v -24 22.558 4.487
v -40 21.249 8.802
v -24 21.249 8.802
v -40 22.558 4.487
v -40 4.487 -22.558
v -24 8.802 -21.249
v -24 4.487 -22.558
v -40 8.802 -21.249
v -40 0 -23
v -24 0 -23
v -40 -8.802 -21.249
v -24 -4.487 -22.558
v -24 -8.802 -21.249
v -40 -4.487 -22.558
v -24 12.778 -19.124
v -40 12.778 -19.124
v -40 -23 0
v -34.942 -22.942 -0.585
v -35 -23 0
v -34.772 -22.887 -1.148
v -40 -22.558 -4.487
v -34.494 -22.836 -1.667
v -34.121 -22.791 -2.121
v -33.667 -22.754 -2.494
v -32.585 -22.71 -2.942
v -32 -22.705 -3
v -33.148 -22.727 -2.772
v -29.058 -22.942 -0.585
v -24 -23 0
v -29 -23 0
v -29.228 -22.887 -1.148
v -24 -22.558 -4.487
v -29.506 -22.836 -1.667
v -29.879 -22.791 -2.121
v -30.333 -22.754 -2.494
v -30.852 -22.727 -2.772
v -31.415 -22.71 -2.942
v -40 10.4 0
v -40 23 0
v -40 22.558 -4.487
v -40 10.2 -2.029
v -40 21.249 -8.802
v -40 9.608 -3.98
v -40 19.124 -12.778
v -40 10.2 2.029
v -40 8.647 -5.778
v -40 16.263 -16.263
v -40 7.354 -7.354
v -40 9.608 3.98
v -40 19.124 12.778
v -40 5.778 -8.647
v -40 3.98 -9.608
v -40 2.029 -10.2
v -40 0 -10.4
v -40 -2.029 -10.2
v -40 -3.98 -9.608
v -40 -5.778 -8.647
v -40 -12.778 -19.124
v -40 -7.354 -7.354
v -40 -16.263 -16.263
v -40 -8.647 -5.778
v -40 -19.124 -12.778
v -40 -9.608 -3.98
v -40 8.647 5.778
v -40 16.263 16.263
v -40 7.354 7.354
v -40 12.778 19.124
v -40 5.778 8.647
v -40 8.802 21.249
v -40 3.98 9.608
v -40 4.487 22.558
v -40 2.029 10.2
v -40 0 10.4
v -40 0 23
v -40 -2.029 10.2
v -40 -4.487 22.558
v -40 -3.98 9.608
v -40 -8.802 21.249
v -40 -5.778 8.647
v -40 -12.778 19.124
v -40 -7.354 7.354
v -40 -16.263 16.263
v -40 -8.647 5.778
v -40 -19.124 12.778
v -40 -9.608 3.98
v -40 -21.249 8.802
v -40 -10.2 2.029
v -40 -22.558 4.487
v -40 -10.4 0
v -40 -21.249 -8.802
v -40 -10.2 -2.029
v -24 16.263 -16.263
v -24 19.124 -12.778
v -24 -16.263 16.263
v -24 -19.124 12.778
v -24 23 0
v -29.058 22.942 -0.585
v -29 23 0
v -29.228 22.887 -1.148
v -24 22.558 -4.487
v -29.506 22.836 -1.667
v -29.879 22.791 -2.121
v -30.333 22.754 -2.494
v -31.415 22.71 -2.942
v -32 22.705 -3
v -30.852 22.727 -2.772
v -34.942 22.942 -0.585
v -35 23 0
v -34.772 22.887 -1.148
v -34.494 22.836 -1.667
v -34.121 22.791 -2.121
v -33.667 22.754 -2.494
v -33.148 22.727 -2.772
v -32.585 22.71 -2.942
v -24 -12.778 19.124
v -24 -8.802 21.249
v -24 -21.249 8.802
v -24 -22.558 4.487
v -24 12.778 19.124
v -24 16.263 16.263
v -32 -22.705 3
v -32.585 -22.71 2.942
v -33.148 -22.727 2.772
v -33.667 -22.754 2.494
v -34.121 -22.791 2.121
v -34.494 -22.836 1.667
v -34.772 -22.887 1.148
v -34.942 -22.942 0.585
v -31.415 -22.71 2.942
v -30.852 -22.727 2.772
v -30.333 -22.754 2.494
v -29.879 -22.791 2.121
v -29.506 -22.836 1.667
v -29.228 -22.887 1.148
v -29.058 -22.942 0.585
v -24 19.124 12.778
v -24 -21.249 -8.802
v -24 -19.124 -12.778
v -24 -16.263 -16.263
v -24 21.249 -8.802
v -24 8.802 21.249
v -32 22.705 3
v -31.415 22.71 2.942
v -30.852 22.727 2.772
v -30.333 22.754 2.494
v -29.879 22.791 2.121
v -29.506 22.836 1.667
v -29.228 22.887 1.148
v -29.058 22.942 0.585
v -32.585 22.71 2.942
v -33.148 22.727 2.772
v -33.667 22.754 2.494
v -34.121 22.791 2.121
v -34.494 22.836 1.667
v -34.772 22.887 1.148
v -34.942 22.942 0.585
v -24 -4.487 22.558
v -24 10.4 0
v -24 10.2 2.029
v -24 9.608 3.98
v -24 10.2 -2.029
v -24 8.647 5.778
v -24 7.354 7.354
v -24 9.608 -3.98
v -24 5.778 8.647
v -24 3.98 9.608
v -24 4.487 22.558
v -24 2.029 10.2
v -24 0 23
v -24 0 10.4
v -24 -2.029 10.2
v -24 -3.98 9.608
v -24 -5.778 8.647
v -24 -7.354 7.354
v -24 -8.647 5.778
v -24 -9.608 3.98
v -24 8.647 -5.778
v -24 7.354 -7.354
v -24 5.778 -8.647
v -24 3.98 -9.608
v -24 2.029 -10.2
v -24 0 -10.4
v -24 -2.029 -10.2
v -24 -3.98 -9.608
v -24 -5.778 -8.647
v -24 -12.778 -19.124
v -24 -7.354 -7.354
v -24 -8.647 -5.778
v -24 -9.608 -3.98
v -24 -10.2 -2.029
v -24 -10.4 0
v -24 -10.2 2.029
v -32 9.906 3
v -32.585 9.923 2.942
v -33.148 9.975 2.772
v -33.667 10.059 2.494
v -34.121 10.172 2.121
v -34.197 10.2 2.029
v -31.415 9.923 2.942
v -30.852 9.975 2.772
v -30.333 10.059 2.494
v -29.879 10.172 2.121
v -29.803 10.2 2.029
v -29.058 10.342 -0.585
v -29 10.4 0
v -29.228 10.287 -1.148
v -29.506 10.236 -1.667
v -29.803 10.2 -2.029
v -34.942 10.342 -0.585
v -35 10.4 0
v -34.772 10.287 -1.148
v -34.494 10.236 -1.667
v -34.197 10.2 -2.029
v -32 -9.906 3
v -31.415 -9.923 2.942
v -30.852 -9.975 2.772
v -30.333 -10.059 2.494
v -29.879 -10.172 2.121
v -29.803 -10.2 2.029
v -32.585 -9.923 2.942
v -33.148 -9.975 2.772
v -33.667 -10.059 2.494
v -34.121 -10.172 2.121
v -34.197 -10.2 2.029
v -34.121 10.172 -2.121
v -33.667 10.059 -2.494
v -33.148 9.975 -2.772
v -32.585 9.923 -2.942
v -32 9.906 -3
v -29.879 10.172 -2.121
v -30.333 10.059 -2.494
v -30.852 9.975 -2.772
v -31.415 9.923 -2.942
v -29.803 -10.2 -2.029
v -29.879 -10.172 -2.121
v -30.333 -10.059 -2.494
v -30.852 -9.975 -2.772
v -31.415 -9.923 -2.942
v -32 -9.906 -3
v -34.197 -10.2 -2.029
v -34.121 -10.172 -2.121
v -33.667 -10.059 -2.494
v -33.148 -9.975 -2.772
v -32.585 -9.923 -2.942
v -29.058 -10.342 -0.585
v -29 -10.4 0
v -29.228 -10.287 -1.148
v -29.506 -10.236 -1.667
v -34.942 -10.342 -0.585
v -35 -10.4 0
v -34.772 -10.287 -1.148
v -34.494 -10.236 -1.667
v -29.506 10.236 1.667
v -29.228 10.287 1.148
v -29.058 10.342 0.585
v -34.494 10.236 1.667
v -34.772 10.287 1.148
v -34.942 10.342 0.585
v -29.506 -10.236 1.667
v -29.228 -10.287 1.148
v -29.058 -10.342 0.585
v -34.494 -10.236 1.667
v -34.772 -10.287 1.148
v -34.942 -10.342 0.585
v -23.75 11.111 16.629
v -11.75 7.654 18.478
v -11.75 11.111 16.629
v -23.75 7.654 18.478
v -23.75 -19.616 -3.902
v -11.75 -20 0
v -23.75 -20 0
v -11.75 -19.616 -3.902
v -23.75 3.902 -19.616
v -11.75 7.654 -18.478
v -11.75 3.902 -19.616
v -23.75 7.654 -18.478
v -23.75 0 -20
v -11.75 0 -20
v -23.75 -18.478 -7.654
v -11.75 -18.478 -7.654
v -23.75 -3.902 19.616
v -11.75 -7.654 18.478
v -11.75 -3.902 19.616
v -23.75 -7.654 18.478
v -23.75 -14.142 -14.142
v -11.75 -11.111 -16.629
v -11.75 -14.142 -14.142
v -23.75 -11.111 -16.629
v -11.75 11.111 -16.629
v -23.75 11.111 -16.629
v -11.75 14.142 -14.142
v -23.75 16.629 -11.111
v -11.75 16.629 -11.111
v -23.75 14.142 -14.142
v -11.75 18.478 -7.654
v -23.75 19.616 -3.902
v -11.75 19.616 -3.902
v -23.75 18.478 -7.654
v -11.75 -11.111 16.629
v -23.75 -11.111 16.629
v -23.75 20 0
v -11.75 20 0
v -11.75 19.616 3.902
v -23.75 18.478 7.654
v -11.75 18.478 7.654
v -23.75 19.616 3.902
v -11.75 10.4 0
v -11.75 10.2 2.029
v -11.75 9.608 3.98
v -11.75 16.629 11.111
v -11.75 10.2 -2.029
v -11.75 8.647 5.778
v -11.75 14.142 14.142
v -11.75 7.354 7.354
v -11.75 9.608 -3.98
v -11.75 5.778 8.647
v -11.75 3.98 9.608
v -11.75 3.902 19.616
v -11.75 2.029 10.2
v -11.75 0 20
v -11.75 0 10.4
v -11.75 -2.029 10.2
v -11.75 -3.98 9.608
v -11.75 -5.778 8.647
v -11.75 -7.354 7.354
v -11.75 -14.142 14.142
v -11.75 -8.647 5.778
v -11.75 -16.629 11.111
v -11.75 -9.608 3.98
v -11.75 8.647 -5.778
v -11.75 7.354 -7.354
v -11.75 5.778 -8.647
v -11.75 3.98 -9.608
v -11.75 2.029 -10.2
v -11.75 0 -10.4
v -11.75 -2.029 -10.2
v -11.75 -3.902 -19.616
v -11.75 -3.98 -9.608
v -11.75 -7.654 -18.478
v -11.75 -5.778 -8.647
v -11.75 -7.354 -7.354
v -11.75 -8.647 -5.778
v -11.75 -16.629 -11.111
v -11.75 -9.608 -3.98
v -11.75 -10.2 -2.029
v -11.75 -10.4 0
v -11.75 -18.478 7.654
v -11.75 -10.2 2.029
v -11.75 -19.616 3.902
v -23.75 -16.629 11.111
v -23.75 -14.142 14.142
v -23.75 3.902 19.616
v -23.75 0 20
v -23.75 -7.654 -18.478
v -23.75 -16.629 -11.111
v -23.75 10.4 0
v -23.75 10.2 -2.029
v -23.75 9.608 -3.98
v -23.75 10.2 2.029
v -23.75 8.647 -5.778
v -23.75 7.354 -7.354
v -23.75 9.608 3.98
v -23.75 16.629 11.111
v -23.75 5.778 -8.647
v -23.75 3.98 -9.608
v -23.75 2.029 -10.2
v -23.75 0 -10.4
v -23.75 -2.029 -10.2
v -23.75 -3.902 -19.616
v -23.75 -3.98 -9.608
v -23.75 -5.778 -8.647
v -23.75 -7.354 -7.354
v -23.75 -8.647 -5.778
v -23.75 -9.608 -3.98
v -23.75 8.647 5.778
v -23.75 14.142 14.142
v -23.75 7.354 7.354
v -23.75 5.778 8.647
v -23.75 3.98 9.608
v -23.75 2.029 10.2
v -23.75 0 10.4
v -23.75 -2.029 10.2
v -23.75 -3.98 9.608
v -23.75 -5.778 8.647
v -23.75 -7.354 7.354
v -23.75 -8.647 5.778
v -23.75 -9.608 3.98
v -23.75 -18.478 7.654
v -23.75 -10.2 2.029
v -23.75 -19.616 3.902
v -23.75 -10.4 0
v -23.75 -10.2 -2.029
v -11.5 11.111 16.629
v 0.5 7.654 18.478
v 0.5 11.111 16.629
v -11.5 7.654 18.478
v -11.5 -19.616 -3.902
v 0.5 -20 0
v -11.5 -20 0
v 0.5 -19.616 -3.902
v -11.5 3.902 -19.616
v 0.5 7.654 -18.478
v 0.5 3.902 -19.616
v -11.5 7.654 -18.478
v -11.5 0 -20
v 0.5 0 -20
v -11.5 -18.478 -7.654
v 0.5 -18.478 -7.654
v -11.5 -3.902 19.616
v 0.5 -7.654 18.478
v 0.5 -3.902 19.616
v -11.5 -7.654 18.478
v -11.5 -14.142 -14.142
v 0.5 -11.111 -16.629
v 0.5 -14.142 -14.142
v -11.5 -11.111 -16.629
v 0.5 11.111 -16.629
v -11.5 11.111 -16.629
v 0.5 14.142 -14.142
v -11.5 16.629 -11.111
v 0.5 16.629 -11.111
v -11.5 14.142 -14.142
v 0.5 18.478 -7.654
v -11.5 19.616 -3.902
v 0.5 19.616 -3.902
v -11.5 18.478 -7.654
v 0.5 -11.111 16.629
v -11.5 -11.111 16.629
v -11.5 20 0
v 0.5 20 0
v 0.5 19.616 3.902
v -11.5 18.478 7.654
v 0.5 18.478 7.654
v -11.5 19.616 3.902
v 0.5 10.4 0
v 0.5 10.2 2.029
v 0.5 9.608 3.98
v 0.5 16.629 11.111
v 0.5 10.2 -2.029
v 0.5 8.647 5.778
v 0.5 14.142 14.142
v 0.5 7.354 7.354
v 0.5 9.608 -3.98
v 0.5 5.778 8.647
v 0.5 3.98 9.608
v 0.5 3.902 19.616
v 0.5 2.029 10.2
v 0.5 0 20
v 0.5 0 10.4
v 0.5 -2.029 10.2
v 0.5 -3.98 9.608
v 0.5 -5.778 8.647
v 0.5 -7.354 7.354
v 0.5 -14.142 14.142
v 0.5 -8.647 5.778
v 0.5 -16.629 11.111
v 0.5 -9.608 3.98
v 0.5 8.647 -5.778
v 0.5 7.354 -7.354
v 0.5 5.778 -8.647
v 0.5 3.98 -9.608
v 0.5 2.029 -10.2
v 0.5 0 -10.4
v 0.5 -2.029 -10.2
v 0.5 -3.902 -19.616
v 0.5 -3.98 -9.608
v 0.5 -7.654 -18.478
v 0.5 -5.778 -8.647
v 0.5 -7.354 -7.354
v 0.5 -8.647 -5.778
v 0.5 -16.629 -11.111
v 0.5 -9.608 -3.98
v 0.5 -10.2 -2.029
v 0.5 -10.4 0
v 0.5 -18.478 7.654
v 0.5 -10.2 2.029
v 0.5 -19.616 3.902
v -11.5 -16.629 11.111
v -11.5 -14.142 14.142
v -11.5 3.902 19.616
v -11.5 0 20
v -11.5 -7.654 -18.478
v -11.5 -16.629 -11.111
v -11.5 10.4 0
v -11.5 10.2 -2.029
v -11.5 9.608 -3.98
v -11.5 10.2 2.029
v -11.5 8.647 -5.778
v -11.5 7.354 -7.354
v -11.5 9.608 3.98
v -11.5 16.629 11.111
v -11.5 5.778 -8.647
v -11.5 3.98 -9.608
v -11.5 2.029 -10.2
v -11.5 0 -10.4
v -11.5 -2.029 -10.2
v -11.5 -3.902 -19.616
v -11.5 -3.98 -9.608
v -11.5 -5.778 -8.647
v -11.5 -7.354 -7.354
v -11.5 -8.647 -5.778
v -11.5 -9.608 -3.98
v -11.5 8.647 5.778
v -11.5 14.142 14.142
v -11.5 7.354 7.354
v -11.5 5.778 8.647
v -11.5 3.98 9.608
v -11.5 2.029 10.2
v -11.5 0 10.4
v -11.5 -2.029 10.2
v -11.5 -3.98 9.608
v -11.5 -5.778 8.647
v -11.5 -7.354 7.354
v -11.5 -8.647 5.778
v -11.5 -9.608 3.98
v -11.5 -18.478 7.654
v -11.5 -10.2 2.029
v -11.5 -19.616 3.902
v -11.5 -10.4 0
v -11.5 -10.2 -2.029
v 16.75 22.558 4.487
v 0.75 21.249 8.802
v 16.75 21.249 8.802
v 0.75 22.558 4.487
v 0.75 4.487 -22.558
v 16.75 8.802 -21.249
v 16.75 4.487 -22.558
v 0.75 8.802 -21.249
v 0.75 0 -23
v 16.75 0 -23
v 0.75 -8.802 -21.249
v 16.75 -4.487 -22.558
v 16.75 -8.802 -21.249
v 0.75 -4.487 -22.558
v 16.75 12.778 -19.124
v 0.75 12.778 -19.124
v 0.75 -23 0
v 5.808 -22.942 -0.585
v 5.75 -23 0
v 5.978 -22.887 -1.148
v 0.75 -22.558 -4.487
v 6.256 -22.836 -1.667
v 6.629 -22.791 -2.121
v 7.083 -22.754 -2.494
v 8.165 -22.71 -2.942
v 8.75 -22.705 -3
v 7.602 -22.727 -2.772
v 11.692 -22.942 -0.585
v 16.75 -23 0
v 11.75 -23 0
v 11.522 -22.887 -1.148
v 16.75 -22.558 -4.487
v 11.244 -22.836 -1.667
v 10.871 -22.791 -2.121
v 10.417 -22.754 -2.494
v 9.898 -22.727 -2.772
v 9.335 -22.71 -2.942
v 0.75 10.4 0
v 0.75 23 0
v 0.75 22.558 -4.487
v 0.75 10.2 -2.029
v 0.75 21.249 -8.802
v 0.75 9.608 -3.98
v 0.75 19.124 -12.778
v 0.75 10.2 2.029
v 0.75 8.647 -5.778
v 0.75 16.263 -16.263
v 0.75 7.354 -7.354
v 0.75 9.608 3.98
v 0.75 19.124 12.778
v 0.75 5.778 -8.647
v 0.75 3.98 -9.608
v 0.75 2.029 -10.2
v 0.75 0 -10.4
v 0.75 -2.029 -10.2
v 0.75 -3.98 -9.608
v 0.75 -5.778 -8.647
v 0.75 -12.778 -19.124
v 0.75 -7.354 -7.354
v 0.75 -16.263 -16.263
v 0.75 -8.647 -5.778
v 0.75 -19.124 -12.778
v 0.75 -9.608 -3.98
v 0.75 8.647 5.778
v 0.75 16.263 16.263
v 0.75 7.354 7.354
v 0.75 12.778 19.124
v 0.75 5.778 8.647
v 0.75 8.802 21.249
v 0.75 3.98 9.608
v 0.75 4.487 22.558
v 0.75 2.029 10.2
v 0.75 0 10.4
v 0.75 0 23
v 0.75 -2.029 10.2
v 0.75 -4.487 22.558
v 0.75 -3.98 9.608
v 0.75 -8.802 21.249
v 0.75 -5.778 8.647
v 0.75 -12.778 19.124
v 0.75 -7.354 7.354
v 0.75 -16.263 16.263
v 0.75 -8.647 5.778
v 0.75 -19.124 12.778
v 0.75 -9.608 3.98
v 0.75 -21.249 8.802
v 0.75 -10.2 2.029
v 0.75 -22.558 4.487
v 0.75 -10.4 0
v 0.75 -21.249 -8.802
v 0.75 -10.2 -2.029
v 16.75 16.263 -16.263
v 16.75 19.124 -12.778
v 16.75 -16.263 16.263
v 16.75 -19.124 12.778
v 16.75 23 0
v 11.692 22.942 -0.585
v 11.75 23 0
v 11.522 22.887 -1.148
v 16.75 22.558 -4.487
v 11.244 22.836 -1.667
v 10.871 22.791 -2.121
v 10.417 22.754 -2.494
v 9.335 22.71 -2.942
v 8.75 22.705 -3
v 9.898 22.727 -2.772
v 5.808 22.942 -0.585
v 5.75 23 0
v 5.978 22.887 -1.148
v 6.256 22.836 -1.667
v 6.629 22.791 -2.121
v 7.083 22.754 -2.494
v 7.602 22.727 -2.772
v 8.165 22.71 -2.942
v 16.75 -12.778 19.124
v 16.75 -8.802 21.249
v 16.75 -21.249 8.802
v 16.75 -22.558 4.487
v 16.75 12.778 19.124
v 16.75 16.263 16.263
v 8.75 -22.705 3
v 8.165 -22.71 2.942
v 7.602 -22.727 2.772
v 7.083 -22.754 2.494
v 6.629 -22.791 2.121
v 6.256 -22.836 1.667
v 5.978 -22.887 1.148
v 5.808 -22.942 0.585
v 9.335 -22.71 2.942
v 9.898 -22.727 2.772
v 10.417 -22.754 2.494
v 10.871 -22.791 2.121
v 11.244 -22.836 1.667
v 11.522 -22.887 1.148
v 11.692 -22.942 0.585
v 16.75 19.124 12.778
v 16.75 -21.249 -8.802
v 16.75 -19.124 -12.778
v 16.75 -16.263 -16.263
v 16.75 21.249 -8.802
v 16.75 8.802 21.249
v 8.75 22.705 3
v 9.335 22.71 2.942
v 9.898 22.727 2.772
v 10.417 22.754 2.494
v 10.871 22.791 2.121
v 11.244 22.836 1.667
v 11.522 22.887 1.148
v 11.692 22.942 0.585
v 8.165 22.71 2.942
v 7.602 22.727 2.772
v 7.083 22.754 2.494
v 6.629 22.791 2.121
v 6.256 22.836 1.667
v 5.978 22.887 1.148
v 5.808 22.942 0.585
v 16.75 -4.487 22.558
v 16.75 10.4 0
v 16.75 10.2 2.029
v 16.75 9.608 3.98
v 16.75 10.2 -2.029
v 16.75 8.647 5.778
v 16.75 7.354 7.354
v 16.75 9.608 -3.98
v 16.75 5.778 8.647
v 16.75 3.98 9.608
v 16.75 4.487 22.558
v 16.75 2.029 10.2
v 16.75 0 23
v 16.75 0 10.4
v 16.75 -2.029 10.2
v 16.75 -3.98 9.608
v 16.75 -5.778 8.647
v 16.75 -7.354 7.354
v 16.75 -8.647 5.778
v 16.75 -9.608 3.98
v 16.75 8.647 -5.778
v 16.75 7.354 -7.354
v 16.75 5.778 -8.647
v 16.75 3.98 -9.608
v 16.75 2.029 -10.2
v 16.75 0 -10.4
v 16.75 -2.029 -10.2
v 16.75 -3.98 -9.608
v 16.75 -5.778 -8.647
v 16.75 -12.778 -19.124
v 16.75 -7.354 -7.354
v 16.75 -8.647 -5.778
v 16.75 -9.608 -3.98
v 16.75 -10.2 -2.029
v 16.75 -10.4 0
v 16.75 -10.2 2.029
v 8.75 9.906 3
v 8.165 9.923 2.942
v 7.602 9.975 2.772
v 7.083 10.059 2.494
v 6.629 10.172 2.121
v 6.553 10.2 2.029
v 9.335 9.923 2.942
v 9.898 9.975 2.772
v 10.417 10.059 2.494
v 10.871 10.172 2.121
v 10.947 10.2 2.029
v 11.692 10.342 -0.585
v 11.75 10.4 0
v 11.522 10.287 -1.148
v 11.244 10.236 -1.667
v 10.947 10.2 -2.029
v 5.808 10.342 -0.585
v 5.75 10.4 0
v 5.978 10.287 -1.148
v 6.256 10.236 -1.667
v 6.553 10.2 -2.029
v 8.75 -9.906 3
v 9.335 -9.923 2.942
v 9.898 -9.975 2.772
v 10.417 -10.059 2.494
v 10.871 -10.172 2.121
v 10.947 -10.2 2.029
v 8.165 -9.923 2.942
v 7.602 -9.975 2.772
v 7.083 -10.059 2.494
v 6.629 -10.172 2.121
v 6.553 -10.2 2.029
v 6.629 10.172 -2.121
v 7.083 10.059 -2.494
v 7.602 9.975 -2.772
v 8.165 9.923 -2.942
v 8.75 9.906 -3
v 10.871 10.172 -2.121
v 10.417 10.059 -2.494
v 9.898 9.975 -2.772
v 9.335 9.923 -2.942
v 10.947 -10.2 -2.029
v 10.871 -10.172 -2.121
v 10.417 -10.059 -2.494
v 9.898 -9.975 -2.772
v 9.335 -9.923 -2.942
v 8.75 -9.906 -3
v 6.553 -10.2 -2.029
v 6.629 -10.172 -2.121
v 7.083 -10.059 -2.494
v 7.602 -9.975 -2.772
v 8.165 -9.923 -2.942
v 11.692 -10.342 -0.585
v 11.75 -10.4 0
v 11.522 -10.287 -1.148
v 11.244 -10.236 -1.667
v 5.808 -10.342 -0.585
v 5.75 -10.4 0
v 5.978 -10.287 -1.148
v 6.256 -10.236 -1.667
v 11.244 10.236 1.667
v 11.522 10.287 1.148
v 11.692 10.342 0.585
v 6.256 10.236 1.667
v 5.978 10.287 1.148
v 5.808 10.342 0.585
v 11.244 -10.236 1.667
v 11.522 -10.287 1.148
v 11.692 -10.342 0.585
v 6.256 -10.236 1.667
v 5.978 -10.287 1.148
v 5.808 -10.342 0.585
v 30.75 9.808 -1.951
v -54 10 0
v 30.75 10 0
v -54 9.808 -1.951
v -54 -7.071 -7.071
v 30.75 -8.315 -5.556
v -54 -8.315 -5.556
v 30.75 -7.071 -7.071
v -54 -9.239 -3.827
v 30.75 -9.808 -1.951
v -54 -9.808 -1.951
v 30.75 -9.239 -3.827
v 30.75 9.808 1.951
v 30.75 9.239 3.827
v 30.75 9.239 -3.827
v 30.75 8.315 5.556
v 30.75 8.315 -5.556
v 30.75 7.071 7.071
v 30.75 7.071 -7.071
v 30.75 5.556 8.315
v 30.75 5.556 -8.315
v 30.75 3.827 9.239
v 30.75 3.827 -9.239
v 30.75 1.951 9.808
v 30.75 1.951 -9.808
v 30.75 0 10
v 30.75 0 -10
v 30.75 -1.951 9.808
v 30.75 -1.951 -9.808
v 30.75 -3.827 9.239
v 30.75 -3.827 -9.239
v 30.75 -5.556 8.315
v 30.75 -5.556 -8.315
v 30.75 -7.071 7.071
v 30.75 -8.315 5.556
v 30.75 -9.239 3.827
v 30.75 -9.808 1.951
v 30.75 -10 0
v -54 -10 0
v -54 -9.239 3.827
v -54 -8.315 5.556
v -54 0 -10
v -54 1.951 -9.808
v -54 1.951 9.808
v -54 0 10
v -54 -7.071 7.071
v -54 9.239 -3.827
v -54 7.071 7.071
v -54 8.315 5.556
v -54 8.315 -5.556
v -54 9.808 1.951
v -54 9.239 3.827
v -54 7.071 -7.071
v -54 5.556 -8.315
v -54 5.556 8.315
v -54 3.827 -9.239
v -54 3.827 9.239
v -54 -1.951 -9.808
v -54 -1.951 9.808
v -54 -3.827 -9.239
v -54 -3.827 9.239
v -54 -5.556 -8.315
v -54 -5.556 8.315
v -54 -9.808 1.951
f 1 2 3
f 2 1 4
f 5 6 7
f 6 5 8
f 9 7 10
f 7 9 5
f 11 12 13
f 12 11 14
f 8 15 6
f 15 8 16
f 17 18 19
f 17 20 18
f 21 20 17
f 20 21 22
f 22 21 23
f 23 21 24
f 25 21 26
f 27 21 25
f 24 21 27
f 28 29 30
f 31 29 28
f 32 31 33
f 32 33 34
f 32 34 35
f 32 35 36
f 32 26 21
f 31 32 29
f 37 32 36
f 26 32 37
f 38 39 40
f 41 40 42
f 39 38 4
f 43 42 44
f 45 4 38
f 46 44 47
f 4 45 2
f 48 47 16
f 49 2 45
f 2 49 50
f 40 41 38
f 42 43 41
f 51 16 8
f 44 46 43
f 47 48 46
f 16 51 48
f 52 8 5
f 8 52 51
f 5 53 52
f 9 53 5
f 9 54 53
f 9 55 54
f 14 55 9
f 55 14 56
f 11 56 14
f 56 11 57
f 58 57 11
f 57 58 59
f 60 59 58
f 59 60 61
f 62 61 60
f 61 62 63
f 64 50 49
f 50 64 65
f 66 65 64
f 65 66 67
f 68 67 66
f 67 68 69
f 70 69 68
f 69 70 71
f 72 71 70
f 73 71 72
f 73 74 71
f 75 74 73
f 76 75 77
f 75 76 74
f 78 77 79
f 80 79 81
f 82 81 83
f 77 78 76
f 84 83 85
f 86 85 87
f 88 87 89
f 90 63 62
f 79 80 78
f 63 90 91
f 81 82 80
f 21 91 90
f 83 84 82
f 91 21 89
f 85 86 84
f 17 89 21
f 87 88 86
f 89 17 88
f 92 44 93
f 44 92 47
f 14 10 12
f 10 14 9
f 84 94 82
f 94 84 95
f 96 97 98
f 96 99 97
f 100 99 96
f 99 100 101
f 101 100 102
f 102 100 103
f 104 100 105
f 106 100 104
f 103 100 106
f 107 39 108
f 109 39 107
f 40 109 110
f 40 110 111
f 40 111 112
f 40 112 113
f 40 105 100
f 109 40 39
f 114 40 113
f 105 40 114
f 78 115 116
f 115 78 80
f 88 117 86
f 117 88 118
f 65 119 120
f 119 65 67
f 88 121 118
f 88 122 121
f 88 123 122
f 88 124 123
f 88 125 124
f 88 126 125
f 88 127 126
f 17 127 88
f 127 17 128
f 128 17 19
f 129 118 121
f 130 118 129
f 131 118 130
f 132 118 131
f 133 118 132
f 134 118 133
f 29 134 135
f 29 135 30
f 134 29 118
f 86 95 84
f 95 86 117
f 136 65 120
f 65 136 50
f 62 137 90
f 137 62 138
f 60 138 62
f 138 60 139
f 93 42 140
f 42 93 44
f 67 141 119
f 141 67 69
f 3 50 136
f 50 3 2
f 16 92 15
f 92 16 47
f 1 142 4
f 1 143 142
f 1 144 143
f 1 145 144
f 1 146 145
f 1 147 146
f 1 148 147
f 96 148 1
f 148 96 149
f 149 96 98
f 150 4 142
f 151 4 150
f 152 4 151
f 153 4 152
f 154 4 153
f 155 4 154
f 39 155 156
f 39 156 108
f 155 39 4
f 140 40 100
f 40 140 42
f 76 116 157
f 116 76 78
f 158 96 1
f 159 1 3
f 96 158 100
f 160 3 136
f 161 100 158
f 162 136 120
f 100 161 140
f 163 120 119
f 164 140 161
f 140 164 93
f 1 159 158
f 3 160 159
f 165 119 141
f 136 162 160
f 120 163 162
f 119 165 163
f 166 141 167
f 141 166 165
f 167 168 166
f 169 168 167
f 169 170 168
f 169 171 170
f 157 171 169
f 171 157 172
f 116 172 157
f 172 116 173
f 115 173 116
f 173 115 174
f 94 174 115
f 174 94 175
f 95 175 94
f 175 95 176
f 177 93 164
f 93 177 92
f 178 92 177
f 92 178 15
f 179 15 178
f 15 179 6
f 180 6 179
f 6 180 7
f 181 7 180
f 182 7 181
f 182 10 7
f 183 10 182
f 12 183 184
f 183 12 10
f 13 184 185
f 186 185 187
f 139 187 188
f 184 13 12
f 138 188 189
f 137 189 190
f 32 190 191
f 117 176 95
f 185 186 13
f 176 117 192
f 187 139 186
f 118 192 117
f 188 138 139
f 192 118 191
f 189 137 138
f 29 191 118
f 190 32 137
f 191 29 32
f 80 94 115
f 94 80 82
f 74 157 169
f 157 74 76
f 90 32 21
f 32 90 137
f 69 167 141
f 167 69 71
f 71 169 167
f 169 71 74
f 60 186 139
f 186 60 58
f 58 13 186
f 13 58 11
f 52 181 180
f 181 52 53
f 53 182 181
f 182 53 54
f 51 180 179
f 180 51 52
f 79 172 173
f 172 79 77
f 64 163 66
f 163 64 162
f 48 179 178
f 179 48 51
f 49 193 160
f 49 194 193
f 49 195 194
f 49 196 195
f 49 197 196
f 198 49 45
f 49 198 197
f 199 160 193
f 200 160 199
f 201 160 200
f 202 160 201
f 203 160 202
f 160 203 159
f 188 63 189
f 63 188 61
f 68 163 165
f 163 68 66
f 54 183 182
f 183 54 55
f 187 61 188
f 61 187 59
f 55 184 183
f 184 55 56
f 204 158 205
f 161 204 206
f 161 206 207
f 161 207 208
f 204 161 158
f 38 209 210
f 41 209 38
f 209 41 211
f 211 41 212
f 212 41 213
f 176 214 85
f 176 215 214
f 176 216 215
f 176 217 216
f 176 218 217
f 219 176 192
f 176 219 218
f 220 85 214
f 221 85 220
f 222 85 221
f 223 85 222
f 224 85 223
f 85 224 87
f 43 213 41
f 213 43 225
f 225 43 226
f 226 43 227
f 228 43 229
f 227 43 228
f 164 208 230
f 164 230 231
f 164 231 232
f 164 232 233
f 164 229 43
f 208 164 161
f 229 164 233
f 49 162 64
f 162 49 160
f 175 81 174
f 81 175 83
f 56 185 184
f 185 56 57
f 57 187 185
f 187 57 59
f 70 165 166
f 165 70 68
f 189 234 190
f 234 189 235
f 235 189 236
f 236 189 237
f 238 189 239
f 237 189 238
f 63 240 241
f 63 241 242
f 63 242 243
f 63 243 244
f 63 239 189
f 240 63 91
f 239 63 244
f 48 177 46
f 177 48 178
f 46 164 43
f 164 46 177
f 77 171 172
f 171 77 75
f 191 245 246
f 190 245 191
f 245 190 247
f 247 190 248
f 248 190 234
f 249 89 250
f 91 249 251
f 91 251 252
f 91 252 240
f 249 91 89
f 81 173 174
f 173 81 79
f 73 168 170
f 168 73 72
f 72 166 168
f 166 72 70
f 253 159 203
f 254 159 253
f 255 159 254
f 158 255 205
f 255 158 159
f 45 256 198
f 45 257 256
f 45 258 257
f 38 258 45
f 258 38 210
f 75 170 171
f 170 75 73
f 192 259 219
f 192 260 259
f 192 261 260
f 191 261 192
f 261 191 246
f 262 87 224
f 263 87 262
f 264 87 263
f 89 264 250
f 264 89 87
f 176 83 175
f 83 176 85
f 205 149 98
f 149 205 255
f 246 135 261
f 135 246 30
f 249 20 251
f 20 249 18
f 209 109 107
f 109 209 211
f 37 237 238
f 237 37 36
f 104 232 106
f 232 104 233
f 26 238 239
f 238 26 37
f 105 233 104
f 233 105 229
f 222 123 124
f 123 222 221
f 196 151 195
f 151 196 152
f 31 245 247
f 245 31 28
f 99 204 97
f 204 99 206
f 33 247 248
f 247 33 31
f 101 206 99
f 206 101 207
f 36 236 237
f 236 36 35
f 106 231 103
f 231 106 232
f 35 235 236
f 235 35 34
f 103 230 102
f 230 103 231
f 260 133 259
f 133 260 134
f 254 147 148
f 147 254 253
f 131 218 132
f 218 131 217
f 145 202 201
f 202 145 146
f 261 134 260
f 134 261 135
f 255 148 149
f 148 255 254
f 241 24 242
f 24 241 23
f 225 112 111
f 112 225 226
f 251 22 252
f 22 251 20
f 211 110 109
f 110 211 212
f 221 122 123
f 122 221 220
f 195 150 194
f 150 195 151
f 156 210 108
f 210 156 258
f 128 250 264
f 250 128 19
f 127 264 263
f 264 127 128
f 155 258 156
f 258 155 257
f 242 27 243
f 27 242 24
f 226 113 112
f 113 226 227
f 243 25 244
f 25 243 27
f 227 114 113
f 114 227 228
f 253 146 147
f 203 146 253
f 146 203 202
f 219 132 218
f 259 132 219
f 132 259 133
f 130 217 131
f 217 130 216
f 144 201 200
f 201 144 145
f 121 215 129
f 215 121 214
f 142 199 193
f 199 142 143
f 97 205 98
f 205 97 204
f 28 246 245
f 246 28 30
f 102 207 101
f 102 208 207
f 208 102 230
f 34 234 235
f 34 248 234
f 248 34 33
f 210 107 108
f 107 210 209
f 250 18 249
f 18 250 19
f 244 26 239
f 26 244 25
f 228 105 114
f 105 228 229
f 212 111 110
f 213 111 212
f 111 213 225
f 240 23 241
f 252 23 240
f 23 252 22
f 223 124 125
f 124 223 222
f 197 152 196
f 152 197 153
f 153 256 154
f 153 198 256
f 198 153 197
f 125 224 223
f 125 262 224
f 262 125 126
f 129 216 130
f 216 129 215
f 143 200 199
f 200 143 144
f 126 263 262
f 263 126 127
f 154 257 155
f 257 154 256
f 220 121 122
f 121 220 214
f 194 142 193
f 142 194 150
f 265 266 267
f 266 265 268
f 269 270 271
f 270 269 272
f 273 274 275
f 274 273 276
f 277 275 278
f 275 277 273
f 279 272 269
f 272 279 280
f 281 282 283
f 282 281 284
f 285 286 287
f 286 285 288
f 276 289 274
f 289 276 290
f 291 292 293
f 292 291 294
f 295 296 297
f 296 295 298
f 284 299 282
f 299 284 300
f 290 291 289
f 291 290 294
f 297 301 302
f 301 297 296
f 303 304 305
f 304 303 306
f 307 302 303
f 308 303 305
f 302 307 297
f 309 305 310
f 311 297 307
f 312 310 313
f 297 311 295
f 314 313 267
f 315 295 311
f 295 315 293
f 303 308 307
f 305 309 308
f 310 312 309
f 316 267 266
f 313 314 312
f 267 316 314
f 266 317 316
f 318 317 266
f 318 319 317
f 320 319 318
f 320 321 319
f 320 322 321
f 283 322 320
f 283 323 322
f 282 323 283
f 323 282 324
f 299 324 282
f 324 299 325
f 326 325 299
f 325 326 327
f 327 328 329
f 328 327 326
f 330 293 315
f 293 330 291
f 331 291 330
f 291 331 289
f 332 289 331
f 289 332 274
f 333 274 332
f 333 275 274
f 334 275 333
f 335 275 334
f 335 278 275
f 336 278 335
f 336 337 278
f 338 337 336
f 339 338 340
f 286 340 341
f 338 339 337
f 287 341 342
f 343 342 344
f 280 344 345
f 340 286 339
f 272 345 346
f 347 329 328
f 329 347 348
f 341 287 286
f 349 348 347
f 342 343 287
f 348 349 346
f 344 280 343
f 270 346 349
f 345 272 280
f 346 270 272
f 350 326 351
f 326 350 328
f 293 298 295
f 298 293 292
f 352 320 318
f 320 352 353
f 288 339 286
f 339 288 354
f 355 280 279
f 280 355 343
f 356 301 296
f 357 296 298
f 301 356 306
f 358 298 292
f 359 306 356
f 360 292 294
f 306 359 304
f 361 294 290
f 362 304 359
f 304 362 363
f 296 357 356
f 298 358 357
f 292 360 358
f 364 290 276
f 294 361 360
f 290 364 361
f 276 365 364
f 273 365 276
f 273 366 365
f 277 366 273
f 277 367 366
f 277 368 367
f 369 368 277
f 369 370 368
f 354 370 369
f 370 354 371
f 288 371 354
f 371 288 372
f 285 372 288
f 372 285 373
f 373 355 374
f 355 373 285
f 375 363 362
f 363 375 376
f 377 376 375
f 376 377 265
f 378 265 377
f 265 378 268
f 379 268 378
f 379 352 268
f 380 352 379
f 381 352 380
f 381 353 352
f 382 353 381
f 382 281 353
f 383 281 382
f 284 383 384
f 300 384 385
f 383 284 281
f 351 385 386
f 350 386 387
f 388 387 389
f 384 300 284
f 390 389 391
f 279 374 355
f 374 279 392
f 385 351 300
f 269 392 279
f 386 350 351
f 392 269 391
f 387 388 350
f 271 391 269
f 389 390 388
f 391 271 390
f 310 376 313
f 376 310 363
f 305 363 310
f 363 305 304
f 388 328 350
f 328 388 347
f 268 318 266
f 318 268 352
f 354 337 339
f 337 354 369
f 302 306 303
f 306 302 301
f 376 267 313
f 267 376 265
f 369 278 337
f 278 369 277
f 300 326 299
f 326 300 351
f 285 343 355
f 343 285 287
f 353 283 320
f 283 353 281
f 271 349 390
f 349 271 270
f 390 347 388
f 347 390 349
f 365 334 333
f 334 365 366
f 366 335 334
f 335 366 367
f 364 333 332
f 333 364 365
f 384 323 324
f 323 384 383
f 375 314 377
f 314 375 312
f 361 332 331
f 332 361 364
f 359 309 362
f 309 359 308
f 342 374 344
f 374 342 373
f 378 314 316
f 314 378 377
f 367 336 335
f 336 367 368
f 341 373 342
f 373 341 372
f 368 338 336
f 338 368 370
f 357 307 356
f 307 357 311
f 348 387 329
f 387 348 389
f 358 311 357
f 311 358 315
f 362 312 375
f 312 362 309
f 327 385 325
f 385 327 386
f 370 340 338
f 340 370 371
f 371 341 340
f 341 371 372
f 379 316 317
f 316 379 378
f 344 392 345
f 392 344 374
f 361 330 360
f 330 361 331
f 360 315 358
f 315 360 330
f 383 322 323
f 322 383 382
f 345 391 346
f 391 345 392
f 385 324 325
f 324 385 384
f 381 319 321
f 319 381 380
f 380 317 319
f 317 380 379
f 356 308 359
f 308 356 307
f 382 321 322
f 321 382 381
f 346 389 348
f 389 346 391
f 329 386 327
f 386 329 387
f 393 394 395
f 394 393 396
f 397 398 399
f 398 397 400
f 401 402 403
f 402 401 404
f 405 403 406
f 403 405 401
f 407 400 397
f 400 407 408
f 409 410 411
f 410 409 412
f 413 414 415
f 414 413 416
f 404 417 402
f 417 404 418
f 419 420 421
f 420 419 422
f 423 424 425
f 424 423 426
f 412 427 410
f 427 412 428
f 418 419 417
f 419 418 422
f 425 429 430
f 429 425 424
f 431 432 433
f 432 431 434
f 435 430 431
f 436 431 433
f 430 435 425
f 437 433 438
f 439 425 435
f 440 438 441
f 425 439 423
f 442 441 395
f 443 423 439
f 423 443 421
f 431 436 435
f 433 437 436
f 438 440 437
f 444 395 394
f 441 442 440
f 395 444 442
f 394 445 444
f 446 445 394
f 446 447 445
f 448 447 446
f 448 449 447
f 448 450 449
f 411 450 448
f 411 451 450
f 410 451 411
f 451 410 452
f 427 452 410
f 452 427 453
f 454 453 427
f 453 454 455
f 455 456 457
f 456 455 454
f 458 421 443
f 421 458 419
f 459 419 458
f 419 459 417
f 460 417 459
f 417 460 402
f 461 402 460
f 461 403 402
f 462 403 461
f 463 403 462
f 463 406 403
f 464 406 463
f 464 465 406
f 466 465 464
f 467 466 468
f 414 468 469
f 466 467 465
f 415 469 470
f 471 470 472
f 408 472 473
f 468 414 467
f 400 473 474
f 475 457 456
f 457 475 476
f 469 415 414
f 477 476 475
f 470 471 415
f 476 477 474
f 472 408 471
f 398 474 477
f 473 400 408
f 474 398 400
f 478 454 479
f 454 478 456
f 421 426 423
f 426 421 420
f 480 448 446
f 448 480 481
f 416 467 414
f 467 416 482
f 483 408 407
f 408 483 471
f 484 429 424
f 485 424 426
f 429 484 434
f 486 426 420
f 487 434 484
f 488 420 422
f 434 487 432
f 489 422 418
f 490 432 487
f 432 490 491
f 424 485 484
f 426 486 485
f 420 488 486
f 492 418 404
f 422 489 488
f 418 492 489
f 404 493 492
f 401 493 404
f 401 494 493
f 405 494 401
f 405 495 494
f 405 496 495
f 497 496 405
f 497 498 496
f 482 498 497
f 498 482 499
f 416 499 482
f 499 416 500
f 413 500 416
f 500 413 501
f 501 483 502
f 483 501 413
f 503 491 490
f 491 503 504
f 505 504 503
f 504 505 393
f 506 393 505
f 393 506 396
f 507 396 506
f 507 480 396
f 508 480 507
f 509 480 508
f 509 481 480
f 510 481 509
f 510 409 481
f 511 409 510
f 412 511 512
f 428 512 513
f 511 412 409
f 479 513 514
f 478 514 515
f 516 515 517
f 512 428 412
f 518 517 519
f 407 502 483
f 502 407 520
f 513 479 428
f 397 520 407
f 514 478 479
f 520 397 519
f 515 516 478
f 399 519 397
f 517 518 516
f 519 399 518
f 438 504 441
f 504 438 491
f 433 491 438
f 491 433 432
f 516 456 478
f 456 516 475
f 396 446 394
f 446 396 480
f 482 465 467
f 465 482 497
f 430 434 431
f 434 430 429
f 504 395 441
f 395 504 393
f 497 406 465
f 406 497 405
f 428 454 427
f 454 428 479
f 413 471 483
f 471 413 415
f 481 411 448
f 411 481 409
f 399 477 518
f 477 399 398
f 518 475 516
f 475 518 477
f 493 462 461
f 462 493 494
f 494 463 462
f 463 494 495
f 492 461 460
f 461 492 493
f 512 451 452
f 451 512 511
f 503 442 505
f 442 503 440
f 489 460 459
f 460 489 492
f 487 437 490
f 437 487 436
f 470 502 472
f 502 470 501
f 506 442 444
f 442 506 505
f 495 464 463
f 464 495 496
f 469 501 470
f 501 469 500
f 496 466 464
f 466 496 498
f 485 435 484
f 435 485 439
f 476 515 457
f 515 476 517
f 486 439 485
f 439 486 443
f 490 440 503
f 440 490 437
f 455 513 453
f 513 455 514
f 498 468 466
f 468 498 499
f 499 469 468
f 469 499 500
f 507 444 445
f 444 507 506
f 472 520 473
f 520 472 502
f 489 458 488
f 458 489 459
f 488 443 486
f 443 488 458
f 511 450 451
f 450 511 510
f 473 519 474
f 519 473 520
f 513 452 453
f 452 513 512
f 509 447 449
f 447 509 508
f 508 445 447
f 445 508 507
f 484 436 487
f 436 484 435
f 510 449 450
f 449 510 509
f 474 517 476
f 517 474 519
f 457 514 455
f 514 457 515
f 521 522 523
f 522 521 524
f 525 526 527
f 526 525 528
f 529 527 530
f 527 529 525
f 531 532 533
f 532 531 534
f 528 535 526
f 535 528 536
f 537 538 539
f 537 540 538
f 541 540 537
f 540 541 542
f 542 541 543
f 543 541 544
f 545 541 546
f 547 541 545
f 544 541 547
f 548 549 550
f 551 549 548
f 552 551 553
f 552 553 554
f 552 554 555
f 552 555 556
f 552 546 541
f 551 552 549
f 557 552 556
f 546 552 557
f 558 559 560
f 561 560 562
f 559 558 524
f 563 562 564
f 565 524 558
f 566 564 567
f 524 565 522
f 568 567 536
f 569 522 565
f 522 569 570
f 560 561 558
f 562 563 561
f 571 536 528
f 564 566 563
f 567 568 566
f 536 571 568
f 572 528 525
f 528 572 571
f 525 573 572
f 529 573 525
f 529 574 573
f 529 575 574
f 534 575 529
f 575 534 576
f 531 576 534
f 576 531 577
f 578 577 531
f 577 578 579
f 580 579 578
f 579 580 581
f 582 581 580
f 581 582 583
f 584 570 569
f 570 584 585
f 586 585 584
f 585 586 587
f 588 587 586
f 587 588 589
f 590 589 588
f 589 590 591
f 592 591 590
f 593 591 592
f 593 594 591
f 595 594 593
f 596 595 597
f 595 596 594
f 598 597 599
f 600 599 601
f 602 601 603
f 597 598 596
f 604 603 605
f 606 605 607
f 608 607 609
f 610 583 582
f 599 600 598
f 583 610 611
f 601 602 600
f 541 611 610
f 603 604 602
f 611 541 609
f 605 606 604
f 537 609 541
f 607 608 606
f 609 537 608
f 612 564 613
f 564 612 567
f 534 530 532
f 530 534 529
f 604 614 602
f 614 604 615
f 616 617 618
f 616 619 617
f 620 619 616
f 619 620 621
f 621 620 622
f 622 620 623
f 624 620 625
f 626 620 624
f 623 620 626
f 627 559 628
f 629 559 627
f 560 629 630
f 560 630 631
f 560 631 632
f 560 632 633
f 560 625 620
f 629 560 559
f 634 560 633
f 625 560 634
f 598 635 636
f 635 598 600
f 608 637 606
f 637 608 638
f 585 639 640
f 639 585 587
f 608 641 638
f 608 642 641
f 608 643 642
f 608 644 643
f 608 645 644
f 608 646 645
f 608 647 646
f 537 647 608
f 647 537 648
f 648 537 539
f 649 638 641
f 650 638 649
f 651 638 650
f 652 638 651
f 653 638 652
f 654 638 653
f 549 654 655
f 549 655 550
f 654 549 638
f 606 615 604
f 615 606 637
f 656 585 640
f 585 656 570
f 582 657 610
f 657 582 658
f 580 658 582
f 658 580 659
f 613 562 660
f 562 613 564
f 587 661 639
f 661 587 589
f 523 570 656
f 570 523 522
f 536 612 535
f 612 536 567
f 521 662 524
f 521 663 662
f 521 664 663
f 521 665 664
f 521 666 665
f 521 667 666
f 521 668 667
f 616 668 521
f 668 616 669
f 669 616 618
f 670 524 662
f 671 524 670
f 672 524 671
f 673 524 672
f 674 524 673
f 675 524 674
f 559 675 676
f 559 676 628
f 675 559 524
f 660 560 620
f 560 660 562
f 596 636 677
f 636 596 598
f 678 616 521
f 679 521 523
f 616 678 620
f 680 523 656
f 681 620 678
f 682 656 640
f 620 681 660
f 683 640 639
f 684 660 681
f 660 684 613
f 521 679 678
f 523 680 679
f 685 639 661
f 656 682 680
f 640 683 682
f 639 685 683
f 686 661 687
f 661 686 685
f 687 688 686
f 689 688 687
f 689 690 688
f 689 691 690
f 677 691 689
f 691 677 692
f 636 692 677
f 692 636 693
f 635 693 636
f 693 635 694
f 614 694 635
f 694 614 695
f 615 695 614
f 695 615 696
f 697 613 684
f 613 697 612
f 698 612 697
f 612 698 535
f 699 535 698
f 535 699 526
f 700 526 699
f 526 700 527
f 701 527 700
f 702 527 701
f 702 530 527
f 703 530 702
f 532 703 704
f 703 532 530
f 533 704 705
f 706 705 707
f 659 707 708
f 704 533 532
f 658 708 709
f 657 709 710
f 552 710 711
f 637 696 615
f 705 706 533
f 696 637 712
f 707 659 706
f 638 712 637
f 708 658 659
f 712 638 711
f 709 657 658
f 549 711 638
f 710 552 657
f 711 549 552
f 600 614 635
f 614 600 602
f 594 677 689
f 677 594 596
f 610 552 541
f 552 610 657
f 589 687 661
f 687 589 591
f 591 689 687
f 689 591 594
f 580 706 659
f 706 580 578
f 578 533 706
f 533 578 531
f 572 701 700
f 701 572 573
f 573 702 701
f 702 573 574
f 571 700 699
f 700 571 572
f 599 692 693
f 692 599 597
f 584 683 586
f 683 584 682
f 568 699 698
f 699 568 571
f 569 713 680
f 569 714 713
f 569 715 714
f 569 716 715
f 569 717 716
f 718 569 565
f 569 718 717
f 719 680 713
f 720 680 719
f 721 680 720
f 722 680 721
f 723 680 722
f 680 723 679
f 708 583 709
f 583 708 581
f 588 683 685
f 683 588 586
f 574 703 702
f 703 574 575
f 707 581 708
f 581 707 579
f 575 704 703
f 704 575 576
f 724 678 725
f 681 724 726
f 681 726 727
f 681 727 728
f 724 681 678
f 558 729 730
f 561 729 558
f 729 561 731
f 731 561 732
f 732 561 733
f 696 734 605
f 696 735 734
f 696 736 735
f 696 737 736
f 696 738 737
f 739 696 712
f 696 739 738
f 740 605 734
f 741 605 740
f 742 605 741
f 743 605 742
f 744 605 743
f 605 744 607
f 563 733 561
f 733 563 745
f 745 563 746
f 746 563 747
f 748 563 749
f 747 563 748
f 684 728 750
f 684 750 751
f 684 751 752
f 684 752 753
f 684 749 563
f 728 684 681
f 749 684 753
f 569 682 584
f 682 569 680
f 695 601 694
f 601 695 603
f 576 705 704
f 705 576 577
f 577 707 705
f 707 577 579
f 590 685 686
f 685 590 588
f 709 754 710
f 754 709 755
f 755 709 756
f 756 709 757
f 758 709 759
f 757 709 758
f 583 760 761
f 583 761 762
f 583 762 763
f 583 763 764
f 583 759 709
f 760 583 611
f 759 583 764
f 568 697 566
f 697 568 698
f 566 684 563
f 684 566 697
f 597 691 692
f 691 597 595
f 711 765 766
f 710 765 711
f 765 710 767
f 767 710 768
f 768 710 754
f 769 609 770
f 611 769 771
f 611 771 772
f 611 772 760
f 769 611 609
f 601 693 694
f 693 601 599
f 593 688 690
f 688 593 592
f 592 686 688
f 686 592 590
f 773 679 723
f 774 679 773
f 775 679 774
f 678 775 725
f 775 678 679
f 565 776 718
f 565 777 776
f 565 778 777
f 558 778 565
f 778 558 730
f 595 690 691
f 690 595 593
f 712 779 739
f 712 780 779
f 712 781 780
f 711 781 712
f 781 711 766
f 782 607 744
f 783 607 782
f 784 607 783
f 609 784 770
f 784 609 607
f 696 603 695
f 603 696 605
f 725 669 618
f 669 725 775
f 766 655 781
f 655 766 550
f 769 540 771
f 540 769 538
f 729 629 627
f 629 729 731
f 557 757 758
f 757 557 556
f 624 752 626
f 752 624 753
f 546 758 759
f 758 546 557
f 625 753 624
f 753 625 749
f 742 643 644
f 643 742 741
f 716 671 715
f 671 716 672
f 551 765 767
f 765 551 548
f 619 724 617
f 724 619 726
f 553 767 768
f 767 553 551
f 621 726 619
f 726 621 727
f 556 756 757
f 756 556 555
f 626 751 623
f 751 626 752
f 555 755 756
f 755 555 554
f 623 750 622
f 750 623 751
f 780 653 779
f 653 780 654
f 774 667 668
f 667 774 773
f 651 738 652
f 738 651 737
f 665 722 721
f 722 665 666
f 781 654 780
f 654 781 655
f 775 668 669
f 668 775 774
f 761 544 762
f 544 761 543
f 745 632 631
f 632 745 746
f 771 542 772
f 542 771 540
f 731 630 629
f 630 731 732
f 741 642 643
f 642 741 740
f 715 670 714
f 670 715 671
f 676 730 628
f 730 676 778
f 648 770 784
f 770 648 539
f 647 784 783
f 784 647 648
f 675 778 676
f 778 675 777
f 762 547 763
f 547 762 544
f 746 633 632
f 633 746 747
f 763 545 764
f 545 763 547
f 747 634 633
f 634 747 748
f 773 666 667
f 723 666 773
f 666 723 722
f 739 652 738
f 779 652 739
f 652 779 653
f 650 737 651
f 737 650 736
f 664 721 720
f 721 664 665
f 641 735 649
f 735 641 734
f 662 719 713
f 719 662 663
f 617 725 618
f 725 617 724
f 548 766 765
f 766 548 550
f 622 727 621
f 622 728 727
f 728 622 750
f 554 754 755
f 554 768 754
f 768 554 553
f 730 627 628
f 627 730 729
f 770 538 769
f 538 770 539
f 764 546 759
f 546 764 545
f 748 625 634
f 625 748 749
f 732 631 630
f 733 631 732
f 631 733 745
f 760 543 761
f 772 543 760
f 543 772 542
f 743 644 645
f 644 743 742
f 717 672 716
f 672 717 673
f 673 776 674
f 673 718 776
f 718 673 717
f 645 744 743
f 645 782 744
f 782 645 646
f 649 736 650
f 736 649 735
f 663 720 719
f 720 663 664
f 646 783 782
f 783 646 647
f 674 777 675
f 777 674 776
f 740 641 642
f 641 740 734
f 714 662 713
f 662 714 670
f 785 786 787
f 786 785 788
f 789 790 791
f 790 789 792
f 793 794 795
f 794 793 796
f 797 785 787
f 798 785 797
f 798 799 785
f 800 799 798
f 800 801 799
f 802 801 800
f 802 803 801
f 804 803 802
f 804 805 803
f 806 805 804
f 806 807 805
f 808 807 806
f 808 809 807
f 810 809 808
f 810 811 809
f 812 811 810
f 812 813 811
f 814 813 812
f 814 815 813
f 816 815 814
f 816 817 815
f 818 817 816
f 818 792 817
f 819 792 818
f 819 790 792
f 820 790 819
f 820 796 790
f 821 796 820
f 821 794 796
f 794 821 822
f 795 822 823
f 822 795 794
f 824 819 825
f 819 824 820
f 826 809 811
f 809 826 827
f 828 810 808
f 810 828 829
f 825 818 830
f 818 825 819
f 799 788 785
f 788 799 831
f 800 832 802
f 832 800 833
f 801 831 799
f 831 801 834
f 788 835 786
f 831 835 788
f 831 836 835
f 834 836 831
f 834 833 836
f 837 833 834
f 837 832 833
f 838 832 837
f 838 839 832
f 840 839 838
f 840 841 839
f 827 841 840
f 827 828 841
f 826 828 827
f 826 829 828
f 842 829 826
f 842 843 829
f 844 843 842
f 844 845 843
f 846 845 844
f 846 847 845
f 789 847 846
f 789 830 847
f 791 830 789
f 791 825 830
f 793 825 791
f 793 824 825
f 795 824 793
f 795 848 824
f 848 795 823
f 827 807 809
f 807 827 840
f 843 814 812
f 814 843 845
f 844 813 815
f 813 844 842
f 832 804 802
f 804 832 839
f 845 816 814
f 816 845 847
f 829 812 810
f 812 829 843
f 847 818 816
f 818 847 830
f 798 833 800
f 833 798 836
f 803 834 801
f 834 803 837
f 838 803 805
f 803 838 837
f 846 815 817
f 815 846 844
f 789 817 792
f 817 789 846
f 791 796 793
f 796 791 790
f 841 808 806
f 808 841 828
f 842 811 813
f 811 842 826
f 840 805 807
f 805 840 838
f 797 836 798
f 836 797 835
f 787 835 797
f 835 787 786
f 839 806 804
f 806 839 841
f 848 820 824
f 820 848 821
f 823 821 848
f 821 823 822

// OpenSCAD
$fn = 32;

// ------------------------------------------------------------------------
// Shaft with rings and collars: d20 shaft, 4 rings
// Every part is its own module, assembly() places them once.
// ------------------------------------------------------------------------

// --- part 1 ---
module shaft() {
  translate([0, 0, -42.375]) cylinder(h = 84.75, d = 20);
}

// --- part 2 ---
module collar_a() {
  difference() {
    cylinder(h = 16, d = 46);
    translate([0, 0, -1]) cylinder(h = 18, d = 20.8);
    translate([0, 0, 8]) rotate([90, 0, 0]) cylinder(h = 48, d = 6, center = true);
  }
}

// --- part 3 ---
module spacer_a() {
  difference() {
      translate([0, 0, 0]) cylinder(h = 12, d = 40);
      translate([0, 0, -1]) cylinder(h = 14, d = 20.8);
    }
}

// --- part 4 ---
module spacer_b() {
  difference() {
      translate([0, 0, 0]) cylinder(h = 12, d = 40);
      translate([0, 0, -1]) cylinder(h = 14, d = 20.8);
    }
}

// --- part 5 ---
module collar_b() {
  difference() {
    cylinder(h = 16, d = 46);
    translate([0, 0, -1]) cylinder(h = 18, d = 20.8);
    translate([0, 0, 8]) rotate([90, 0, 0]) cylinder(h = 48, d = 6, center = true);
  }
}

// --- assembly ---
module assembly() {
  translate([-11.625, 0, 0]) rotate([0, 90, 0]) shaft();
  translate([-40, 0, 0]) rotate([0, 90, 0]) collar_a();
  translate([-23.75, 0, 0]) rotate([0, 90, 0]) spacer_a();
  translate([-11.5, 0, 0]) rotate([0, 90, 0]) spacer_b();
  translate([0.75, 0, 0]) rotate([0, 90, 0]) collar_b();
}

assembly();
